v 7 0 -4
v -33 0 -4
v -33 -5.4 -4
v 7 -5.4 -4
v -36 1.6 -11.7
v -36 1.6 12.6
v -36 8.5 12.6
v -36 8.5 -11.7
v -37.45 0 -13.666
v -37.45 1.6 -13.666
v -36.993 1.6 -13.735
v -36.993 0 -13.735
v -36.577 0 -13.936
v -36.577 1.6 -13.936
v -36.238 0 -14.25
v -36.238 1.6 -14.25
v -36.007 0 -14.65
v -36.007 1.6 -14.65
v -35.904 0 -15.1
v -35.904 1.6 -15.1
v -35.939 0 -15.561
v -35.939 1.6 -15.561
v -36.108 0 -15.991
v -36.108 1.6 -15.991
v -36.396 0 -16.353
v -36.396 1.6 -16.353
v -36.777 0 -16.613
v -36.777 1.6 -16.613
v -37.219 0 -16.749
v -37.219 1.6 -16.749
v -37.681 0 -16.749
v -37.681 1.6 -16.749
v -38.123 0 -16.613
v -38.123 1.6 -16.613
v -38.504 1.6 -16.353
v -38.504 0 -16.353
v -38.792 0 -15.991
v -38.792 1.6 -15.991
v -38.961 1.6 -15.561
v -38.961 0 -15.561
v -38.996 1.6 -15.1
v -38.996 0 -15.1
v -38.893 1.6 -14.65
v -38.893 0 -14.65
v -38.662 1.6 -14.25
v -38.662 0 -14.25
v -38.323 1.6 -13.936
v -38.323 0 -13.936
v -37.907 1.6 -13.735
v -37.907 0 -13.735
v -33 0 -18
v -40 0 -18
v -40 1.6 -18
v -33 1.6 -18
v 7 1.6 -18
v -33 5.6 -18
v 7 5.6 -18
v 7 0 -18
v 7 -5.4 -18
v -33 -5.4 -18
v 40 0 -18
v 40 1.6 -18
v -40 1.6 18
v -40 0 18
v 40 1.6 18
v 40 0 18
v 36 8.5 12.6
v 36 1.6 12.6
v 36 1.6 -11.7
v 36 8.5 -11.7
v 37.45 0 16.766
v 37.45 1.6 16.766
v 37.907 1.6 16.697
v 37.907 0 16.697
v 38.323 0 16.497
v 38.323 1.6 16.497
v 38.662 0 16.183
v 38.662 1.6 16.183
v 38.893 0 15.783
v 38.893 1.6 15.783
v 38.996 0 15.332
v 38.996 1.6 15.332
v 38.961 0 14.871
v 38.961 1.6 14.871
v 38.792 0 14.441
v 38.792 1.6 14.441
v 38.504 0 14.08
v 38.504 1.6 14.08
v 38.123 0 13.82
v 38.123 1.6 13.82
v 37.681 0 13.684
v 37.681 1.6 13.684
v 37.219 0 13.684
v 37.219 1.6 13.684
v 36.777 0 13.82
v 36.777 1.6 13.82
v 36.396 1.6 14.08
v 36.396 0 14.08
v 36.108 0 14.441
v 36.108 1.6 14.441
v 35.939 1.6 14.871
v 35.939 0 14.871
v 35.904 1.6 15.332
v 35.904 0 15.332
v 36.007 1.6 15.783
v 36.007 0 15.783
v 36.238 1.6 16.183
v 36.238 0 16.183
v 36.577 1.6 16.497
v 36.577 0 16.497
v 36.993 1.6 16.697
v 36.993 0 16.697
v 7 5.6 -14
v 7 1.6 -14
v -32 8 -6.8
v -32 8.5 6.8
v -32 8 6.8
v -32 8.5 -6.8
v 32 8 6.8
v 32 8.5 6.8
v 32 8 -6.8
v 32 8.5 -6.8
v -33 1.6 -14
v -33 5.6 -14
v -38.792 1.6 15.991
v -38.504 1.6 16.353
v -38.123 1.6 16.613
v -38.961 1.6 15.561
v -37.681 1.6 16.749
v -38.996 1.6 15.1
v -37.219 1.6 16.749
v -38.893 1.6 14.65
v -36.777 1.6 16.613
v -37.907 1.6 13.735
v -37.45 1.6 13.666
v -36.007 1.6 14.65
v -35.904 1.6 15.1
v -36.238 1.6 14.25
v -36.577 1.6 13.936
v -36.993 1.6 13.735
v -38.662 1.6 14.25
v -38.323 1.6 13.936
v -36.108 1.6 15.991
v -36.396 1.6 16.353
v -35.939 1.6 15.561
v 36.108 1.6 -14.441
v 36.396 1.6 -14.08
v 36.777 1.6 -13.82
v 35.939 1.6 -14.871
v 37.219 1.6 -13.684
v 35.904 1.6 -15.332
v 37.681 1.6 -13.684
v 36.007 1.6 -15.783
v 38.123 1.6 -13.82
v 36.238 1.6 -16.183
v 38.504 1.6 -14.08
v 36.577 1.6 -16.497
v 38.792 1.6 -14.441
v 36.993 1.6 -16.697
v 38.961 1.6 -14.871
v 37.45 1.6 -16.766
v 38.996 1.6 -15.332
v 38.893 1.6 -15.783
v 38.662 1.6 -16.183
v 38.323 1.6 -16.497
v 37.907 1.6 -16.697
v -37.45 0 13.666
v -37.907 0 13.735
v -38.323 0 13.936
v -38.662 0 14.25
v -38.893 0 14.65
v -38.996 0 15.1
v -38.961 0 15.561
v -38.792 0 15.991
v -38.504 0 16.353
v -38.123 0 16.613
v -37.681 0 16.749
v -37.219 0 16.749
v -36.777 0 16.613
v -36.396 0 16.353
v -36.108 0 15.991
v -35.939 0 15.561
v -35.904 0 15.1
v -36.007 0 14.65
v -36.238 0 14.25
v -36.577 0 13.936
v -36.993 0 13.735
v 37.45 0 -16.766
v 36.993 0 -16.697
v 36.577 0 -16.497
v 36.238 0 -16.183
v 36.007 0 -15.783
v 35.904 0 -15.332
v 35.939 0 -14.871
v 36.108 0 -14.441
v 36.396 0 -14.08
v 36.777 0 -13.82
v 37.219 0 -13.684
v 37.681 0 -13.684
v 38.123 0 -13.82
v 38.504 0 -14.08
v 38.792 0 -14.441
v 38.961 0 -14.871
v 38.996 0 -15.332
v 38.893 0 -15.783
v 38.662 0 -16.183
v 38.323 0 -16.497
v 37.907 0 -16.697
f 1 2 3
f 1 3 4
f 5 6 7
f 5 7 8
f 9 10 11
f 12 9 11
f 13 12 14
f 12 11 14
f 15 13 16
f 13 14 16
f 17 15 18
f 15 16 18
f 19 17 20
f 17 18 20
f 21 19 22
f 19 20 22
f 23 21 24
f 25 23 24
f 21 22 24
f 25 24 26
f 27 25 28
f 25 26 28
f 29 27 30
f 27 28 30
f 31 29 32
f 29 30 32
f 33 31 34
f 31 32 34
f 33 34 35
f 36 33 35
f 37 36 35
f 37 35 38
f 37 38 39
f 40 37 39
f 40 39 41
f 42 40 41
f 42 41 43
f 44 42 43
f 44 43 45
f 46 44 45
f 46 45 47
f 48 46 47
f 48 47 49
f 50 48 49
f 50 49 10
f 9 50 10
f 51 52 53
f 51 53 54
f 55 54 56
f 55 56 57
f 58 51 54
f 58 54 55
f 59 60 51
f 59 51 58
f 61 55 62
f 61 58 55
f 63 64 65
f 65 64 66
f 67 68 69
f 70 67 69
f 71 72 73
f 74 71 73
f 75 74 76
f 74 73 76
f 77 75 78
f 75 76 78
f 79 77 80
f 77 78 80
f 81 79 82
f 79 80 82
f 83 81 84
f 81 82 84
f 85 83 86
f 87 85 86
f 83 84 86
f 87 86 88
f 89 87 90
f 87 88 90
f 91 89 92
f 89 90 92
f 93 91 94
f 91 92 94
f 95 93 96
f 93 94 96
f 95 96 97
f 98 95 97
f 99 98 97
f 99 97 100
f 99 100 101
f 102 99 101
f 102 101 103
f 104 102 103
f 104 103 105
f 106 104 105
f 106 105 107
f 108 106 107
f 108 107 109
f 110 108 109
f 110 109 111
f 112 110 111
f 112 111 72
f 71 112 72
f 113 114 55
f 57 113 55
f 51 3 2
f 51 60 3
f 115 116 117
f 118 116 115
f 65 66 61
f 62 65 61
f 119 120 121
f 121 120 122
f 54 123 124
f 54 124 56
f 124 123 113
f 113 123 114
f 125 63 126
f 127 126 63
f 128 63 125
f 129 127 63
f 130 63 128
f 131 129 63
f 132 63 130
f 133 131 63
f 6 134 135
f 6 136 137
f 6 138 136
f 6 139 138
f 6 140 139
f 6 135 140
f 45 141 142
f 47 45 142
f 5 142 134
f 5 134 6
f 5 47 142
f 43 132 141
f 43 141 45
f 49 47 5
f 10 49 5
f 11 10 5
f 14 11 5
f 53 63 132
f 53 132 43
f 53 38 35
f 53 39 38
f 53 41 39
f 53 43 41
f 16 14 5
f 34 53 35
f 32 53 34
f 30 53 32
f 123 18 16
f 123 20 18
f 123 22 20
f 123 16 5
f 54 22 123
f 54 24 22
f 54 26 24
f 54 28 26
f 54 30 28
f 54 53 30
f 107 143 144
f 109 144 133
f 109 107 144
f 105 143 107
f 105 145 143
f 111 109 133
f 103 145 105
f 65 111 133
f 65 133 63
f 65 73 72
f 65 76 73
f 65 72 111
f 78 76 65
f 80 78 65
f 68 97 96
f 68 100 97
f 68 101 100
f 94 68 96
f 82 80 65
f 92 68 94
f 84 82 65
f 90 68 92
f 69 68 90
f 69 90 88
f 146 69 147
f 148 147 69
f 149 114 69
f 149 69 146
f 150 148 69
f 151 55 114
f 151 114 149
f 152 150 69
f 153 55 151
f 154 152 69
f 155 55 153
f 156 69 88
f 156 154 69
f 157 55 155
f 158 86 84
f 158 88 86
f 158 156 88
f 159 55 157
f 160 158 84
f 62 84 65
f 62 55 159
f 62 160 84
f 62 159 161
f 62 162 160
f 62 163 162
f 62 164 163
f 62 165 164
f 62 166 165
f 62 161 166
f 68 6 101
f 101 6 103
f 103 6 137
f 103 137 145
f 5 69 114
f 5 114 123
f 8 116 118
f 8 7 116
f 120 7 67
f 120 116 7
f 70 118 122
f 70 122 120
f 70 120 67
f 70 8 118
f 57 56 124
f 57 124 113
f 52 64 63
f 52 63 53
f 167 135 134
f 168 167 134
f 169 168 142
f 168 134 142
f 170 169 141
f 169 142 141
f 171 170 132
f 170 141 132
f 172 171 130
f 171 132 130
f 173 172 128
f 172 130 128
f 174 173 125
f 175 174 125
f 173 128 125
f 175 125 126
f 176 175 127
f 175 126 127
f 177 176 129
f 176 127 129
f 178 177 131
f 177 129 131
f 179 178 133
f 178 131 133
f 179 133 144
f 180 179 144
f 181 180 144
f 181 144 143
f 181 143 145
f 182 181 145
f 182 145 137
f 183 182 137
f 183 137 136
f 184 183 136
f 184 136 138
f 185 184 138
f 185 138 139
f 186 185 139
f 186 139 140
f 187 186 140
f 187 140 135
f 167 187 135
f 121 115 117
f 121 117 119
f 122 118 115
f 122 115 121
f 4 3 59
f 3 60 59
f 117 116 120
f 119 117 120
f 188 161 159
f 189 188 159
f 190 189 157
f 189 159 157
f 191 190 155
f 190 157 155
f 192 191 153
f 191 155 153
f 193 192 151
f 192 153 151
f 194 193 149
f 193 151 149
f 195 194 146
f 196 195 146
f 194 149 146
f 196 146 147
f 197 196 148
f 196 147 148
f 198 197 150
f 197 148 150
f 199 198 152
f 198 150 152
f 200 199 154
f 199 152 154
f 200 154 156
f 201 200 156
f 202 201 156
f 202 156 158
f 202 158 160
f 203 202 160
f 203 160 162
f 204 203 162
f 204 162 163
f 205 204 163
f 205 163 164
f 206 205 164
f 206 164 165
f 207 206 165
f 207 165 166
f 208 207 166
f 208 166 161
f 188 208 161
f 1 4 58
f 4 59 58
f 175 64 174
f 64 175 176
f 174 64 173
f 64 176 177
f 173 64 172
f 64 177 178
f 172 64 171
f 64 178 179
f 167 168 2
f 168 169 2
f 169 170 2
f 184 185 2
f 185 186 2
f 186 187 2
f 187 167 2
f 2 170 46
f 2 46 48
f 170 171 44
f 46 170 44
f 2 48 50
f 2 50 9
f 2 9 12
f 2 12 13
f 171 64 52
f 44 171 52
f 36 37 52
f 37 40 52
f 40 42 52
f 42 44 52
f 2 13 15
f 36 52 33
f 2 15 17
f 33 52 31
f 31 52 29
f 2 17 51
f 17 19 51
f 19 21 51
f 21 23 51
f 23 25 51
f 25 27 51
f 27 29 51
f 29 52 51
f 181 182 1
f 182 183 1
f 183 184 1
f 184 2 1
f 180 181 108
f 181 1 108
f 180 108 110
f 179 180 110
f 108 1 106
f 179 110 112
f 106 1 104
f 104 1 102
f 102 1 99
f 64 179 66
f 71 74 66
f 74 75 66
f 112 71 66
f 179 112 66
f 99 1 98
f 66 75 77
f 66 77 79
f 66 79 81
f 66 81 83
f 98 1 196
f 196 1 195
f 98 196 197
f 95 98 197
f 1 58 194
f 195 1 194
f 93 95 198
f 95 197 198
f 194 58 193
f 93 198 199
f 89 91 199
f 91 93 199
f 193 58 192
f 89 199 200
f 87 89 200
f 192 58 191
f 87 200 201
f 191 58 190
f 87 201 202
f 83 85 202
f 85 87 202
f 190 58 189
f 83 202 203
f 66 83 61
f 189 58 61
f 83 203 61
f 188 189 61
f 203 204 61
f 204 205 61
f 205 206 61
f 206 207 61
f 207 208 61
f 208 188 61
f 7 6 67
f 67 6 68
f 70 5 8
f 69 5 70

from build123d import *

# Parameters (mm, degrees)
SKETCH1_W                = 80
SKETCH1_H                = 36
BOSS_EXTRUDE1_DEPTH      = 1.6
SKETCH2_W                = 72
SKETCH2_H                = 24.3
BOSS_EXTRUDE2_DEPTH      = 6.9
SKETCH3_W                = 64
SKETCH3_H                = 13.6
CUT_EXTRUDE1_DEPTH       = 0.5
BOSS_EXTRUDE3_DEPTH      = 4
BOSS_EXTRUDE3_DEPTH_BACK = 7
SKETCH5_W                = 40
SKETCH5_H                = 4
SKETCH7_R                = 1.55
CUT_EXTRUDE2_DEPTH       = 45.418464629
SKETCH8_W                = 40
SKETCH8_H                = 5.4
BOSS_EXTRUDE4_DEPTH      = 10


with BuildPart() as part:
    # Sketch1 → Boss-Extrude1 (new body)
    with BuildSketch(Plane(origin=(0, 0, 0), x_dir=(1, 0, 0), z_dir=(0, 1, 0))):
        Rectangle(SKETCH1_W, SKETCH1_H)
    extrude(amount=BOSS_EXTRUDE1_DEPTH)

    # Sketch2 → Boss-Extrude2 (add)
    with BuildSketch(Plane(origin=(0, 1.6, 0), x_dir=(1, 0, 0), z_dir=(0, 1, 0))):
        with Locations((0, -0.45)):
            Rectangle(SKETCH2_W, SKETCH2_H)
    extrude(amount=BOSS_EXTRUDE2_DEPTH)

    # Sketch3 → Cut-Extrude1 (cut)
    with BuildSketch(Plane(origin=(0, 8.5, 0), x_dir=(1, 0, 0), z_dir=(0, 1, 0))):
        Rectangle(SKETCH3_W, SKETCH3_H)
    extrude(amount=-CUT_EXTRUDE1_DEPTH, mode=Mode.SUBTRACT)

    # Sketch5 → Boss-Extrude3 (add, two sides: drawn at the far end of the back side and taken through both)
    with BuildSketch(Plane(origin=(0, 1.6, 0), x_dir=(1, 0, 0), z_dir=(0, 1, 0)).offset(-BOSS_EXTRUDE3_DEPTH_BACK)):
        with Locations((-13, 16)):
            Rectangle(SKETCH5_W, SKETCH5_H)
    extrude(amount=BOSS_EXTRUDE3_DEPTH + BOSS_EXTRUDE3_DEPTH_BACK)

    # Sketch7 → Cut-Extrude2 (cut, through all)
    with BuildSketch(Plane(origin=(0, 1.6, 0), x_dir=(1, 0, 0), z_dir=(0, 1, 0))):
        with Locations(Location((-37.45, 15.216322293, 0), (0, 0, 270))):
            Circle(SKETCH7_R)
        with Locations(Location((37.45, 15.216322293, 0), (0, 0, 90))):
            Circle(SKETCH7_R)
        with Locations(Location((37.45, -15.216322293, 0), (0, 0, 270))):
            Circle(SKETCH7_R)
        with Locations(Location((-37.45, -15.216322293, 0), (0, 0, 90))):
            Circle(SKETCH7_R)
    extrude(amount=-CUT_EXTRUDE2_DEPTH, mode=Mode.SUBTRACT)

    # Sketch8 → Boss-Extrude4 (add)
    with BuildSketch(Plane.XY.offset(-14)):
        with Locations((-13, -2.7)):
            Rectangle(SKETCH8_W, SKETCH8_H)
    extrude(amount=BOSS_EXTRUDE4_DEPTH)


solid = part.part
